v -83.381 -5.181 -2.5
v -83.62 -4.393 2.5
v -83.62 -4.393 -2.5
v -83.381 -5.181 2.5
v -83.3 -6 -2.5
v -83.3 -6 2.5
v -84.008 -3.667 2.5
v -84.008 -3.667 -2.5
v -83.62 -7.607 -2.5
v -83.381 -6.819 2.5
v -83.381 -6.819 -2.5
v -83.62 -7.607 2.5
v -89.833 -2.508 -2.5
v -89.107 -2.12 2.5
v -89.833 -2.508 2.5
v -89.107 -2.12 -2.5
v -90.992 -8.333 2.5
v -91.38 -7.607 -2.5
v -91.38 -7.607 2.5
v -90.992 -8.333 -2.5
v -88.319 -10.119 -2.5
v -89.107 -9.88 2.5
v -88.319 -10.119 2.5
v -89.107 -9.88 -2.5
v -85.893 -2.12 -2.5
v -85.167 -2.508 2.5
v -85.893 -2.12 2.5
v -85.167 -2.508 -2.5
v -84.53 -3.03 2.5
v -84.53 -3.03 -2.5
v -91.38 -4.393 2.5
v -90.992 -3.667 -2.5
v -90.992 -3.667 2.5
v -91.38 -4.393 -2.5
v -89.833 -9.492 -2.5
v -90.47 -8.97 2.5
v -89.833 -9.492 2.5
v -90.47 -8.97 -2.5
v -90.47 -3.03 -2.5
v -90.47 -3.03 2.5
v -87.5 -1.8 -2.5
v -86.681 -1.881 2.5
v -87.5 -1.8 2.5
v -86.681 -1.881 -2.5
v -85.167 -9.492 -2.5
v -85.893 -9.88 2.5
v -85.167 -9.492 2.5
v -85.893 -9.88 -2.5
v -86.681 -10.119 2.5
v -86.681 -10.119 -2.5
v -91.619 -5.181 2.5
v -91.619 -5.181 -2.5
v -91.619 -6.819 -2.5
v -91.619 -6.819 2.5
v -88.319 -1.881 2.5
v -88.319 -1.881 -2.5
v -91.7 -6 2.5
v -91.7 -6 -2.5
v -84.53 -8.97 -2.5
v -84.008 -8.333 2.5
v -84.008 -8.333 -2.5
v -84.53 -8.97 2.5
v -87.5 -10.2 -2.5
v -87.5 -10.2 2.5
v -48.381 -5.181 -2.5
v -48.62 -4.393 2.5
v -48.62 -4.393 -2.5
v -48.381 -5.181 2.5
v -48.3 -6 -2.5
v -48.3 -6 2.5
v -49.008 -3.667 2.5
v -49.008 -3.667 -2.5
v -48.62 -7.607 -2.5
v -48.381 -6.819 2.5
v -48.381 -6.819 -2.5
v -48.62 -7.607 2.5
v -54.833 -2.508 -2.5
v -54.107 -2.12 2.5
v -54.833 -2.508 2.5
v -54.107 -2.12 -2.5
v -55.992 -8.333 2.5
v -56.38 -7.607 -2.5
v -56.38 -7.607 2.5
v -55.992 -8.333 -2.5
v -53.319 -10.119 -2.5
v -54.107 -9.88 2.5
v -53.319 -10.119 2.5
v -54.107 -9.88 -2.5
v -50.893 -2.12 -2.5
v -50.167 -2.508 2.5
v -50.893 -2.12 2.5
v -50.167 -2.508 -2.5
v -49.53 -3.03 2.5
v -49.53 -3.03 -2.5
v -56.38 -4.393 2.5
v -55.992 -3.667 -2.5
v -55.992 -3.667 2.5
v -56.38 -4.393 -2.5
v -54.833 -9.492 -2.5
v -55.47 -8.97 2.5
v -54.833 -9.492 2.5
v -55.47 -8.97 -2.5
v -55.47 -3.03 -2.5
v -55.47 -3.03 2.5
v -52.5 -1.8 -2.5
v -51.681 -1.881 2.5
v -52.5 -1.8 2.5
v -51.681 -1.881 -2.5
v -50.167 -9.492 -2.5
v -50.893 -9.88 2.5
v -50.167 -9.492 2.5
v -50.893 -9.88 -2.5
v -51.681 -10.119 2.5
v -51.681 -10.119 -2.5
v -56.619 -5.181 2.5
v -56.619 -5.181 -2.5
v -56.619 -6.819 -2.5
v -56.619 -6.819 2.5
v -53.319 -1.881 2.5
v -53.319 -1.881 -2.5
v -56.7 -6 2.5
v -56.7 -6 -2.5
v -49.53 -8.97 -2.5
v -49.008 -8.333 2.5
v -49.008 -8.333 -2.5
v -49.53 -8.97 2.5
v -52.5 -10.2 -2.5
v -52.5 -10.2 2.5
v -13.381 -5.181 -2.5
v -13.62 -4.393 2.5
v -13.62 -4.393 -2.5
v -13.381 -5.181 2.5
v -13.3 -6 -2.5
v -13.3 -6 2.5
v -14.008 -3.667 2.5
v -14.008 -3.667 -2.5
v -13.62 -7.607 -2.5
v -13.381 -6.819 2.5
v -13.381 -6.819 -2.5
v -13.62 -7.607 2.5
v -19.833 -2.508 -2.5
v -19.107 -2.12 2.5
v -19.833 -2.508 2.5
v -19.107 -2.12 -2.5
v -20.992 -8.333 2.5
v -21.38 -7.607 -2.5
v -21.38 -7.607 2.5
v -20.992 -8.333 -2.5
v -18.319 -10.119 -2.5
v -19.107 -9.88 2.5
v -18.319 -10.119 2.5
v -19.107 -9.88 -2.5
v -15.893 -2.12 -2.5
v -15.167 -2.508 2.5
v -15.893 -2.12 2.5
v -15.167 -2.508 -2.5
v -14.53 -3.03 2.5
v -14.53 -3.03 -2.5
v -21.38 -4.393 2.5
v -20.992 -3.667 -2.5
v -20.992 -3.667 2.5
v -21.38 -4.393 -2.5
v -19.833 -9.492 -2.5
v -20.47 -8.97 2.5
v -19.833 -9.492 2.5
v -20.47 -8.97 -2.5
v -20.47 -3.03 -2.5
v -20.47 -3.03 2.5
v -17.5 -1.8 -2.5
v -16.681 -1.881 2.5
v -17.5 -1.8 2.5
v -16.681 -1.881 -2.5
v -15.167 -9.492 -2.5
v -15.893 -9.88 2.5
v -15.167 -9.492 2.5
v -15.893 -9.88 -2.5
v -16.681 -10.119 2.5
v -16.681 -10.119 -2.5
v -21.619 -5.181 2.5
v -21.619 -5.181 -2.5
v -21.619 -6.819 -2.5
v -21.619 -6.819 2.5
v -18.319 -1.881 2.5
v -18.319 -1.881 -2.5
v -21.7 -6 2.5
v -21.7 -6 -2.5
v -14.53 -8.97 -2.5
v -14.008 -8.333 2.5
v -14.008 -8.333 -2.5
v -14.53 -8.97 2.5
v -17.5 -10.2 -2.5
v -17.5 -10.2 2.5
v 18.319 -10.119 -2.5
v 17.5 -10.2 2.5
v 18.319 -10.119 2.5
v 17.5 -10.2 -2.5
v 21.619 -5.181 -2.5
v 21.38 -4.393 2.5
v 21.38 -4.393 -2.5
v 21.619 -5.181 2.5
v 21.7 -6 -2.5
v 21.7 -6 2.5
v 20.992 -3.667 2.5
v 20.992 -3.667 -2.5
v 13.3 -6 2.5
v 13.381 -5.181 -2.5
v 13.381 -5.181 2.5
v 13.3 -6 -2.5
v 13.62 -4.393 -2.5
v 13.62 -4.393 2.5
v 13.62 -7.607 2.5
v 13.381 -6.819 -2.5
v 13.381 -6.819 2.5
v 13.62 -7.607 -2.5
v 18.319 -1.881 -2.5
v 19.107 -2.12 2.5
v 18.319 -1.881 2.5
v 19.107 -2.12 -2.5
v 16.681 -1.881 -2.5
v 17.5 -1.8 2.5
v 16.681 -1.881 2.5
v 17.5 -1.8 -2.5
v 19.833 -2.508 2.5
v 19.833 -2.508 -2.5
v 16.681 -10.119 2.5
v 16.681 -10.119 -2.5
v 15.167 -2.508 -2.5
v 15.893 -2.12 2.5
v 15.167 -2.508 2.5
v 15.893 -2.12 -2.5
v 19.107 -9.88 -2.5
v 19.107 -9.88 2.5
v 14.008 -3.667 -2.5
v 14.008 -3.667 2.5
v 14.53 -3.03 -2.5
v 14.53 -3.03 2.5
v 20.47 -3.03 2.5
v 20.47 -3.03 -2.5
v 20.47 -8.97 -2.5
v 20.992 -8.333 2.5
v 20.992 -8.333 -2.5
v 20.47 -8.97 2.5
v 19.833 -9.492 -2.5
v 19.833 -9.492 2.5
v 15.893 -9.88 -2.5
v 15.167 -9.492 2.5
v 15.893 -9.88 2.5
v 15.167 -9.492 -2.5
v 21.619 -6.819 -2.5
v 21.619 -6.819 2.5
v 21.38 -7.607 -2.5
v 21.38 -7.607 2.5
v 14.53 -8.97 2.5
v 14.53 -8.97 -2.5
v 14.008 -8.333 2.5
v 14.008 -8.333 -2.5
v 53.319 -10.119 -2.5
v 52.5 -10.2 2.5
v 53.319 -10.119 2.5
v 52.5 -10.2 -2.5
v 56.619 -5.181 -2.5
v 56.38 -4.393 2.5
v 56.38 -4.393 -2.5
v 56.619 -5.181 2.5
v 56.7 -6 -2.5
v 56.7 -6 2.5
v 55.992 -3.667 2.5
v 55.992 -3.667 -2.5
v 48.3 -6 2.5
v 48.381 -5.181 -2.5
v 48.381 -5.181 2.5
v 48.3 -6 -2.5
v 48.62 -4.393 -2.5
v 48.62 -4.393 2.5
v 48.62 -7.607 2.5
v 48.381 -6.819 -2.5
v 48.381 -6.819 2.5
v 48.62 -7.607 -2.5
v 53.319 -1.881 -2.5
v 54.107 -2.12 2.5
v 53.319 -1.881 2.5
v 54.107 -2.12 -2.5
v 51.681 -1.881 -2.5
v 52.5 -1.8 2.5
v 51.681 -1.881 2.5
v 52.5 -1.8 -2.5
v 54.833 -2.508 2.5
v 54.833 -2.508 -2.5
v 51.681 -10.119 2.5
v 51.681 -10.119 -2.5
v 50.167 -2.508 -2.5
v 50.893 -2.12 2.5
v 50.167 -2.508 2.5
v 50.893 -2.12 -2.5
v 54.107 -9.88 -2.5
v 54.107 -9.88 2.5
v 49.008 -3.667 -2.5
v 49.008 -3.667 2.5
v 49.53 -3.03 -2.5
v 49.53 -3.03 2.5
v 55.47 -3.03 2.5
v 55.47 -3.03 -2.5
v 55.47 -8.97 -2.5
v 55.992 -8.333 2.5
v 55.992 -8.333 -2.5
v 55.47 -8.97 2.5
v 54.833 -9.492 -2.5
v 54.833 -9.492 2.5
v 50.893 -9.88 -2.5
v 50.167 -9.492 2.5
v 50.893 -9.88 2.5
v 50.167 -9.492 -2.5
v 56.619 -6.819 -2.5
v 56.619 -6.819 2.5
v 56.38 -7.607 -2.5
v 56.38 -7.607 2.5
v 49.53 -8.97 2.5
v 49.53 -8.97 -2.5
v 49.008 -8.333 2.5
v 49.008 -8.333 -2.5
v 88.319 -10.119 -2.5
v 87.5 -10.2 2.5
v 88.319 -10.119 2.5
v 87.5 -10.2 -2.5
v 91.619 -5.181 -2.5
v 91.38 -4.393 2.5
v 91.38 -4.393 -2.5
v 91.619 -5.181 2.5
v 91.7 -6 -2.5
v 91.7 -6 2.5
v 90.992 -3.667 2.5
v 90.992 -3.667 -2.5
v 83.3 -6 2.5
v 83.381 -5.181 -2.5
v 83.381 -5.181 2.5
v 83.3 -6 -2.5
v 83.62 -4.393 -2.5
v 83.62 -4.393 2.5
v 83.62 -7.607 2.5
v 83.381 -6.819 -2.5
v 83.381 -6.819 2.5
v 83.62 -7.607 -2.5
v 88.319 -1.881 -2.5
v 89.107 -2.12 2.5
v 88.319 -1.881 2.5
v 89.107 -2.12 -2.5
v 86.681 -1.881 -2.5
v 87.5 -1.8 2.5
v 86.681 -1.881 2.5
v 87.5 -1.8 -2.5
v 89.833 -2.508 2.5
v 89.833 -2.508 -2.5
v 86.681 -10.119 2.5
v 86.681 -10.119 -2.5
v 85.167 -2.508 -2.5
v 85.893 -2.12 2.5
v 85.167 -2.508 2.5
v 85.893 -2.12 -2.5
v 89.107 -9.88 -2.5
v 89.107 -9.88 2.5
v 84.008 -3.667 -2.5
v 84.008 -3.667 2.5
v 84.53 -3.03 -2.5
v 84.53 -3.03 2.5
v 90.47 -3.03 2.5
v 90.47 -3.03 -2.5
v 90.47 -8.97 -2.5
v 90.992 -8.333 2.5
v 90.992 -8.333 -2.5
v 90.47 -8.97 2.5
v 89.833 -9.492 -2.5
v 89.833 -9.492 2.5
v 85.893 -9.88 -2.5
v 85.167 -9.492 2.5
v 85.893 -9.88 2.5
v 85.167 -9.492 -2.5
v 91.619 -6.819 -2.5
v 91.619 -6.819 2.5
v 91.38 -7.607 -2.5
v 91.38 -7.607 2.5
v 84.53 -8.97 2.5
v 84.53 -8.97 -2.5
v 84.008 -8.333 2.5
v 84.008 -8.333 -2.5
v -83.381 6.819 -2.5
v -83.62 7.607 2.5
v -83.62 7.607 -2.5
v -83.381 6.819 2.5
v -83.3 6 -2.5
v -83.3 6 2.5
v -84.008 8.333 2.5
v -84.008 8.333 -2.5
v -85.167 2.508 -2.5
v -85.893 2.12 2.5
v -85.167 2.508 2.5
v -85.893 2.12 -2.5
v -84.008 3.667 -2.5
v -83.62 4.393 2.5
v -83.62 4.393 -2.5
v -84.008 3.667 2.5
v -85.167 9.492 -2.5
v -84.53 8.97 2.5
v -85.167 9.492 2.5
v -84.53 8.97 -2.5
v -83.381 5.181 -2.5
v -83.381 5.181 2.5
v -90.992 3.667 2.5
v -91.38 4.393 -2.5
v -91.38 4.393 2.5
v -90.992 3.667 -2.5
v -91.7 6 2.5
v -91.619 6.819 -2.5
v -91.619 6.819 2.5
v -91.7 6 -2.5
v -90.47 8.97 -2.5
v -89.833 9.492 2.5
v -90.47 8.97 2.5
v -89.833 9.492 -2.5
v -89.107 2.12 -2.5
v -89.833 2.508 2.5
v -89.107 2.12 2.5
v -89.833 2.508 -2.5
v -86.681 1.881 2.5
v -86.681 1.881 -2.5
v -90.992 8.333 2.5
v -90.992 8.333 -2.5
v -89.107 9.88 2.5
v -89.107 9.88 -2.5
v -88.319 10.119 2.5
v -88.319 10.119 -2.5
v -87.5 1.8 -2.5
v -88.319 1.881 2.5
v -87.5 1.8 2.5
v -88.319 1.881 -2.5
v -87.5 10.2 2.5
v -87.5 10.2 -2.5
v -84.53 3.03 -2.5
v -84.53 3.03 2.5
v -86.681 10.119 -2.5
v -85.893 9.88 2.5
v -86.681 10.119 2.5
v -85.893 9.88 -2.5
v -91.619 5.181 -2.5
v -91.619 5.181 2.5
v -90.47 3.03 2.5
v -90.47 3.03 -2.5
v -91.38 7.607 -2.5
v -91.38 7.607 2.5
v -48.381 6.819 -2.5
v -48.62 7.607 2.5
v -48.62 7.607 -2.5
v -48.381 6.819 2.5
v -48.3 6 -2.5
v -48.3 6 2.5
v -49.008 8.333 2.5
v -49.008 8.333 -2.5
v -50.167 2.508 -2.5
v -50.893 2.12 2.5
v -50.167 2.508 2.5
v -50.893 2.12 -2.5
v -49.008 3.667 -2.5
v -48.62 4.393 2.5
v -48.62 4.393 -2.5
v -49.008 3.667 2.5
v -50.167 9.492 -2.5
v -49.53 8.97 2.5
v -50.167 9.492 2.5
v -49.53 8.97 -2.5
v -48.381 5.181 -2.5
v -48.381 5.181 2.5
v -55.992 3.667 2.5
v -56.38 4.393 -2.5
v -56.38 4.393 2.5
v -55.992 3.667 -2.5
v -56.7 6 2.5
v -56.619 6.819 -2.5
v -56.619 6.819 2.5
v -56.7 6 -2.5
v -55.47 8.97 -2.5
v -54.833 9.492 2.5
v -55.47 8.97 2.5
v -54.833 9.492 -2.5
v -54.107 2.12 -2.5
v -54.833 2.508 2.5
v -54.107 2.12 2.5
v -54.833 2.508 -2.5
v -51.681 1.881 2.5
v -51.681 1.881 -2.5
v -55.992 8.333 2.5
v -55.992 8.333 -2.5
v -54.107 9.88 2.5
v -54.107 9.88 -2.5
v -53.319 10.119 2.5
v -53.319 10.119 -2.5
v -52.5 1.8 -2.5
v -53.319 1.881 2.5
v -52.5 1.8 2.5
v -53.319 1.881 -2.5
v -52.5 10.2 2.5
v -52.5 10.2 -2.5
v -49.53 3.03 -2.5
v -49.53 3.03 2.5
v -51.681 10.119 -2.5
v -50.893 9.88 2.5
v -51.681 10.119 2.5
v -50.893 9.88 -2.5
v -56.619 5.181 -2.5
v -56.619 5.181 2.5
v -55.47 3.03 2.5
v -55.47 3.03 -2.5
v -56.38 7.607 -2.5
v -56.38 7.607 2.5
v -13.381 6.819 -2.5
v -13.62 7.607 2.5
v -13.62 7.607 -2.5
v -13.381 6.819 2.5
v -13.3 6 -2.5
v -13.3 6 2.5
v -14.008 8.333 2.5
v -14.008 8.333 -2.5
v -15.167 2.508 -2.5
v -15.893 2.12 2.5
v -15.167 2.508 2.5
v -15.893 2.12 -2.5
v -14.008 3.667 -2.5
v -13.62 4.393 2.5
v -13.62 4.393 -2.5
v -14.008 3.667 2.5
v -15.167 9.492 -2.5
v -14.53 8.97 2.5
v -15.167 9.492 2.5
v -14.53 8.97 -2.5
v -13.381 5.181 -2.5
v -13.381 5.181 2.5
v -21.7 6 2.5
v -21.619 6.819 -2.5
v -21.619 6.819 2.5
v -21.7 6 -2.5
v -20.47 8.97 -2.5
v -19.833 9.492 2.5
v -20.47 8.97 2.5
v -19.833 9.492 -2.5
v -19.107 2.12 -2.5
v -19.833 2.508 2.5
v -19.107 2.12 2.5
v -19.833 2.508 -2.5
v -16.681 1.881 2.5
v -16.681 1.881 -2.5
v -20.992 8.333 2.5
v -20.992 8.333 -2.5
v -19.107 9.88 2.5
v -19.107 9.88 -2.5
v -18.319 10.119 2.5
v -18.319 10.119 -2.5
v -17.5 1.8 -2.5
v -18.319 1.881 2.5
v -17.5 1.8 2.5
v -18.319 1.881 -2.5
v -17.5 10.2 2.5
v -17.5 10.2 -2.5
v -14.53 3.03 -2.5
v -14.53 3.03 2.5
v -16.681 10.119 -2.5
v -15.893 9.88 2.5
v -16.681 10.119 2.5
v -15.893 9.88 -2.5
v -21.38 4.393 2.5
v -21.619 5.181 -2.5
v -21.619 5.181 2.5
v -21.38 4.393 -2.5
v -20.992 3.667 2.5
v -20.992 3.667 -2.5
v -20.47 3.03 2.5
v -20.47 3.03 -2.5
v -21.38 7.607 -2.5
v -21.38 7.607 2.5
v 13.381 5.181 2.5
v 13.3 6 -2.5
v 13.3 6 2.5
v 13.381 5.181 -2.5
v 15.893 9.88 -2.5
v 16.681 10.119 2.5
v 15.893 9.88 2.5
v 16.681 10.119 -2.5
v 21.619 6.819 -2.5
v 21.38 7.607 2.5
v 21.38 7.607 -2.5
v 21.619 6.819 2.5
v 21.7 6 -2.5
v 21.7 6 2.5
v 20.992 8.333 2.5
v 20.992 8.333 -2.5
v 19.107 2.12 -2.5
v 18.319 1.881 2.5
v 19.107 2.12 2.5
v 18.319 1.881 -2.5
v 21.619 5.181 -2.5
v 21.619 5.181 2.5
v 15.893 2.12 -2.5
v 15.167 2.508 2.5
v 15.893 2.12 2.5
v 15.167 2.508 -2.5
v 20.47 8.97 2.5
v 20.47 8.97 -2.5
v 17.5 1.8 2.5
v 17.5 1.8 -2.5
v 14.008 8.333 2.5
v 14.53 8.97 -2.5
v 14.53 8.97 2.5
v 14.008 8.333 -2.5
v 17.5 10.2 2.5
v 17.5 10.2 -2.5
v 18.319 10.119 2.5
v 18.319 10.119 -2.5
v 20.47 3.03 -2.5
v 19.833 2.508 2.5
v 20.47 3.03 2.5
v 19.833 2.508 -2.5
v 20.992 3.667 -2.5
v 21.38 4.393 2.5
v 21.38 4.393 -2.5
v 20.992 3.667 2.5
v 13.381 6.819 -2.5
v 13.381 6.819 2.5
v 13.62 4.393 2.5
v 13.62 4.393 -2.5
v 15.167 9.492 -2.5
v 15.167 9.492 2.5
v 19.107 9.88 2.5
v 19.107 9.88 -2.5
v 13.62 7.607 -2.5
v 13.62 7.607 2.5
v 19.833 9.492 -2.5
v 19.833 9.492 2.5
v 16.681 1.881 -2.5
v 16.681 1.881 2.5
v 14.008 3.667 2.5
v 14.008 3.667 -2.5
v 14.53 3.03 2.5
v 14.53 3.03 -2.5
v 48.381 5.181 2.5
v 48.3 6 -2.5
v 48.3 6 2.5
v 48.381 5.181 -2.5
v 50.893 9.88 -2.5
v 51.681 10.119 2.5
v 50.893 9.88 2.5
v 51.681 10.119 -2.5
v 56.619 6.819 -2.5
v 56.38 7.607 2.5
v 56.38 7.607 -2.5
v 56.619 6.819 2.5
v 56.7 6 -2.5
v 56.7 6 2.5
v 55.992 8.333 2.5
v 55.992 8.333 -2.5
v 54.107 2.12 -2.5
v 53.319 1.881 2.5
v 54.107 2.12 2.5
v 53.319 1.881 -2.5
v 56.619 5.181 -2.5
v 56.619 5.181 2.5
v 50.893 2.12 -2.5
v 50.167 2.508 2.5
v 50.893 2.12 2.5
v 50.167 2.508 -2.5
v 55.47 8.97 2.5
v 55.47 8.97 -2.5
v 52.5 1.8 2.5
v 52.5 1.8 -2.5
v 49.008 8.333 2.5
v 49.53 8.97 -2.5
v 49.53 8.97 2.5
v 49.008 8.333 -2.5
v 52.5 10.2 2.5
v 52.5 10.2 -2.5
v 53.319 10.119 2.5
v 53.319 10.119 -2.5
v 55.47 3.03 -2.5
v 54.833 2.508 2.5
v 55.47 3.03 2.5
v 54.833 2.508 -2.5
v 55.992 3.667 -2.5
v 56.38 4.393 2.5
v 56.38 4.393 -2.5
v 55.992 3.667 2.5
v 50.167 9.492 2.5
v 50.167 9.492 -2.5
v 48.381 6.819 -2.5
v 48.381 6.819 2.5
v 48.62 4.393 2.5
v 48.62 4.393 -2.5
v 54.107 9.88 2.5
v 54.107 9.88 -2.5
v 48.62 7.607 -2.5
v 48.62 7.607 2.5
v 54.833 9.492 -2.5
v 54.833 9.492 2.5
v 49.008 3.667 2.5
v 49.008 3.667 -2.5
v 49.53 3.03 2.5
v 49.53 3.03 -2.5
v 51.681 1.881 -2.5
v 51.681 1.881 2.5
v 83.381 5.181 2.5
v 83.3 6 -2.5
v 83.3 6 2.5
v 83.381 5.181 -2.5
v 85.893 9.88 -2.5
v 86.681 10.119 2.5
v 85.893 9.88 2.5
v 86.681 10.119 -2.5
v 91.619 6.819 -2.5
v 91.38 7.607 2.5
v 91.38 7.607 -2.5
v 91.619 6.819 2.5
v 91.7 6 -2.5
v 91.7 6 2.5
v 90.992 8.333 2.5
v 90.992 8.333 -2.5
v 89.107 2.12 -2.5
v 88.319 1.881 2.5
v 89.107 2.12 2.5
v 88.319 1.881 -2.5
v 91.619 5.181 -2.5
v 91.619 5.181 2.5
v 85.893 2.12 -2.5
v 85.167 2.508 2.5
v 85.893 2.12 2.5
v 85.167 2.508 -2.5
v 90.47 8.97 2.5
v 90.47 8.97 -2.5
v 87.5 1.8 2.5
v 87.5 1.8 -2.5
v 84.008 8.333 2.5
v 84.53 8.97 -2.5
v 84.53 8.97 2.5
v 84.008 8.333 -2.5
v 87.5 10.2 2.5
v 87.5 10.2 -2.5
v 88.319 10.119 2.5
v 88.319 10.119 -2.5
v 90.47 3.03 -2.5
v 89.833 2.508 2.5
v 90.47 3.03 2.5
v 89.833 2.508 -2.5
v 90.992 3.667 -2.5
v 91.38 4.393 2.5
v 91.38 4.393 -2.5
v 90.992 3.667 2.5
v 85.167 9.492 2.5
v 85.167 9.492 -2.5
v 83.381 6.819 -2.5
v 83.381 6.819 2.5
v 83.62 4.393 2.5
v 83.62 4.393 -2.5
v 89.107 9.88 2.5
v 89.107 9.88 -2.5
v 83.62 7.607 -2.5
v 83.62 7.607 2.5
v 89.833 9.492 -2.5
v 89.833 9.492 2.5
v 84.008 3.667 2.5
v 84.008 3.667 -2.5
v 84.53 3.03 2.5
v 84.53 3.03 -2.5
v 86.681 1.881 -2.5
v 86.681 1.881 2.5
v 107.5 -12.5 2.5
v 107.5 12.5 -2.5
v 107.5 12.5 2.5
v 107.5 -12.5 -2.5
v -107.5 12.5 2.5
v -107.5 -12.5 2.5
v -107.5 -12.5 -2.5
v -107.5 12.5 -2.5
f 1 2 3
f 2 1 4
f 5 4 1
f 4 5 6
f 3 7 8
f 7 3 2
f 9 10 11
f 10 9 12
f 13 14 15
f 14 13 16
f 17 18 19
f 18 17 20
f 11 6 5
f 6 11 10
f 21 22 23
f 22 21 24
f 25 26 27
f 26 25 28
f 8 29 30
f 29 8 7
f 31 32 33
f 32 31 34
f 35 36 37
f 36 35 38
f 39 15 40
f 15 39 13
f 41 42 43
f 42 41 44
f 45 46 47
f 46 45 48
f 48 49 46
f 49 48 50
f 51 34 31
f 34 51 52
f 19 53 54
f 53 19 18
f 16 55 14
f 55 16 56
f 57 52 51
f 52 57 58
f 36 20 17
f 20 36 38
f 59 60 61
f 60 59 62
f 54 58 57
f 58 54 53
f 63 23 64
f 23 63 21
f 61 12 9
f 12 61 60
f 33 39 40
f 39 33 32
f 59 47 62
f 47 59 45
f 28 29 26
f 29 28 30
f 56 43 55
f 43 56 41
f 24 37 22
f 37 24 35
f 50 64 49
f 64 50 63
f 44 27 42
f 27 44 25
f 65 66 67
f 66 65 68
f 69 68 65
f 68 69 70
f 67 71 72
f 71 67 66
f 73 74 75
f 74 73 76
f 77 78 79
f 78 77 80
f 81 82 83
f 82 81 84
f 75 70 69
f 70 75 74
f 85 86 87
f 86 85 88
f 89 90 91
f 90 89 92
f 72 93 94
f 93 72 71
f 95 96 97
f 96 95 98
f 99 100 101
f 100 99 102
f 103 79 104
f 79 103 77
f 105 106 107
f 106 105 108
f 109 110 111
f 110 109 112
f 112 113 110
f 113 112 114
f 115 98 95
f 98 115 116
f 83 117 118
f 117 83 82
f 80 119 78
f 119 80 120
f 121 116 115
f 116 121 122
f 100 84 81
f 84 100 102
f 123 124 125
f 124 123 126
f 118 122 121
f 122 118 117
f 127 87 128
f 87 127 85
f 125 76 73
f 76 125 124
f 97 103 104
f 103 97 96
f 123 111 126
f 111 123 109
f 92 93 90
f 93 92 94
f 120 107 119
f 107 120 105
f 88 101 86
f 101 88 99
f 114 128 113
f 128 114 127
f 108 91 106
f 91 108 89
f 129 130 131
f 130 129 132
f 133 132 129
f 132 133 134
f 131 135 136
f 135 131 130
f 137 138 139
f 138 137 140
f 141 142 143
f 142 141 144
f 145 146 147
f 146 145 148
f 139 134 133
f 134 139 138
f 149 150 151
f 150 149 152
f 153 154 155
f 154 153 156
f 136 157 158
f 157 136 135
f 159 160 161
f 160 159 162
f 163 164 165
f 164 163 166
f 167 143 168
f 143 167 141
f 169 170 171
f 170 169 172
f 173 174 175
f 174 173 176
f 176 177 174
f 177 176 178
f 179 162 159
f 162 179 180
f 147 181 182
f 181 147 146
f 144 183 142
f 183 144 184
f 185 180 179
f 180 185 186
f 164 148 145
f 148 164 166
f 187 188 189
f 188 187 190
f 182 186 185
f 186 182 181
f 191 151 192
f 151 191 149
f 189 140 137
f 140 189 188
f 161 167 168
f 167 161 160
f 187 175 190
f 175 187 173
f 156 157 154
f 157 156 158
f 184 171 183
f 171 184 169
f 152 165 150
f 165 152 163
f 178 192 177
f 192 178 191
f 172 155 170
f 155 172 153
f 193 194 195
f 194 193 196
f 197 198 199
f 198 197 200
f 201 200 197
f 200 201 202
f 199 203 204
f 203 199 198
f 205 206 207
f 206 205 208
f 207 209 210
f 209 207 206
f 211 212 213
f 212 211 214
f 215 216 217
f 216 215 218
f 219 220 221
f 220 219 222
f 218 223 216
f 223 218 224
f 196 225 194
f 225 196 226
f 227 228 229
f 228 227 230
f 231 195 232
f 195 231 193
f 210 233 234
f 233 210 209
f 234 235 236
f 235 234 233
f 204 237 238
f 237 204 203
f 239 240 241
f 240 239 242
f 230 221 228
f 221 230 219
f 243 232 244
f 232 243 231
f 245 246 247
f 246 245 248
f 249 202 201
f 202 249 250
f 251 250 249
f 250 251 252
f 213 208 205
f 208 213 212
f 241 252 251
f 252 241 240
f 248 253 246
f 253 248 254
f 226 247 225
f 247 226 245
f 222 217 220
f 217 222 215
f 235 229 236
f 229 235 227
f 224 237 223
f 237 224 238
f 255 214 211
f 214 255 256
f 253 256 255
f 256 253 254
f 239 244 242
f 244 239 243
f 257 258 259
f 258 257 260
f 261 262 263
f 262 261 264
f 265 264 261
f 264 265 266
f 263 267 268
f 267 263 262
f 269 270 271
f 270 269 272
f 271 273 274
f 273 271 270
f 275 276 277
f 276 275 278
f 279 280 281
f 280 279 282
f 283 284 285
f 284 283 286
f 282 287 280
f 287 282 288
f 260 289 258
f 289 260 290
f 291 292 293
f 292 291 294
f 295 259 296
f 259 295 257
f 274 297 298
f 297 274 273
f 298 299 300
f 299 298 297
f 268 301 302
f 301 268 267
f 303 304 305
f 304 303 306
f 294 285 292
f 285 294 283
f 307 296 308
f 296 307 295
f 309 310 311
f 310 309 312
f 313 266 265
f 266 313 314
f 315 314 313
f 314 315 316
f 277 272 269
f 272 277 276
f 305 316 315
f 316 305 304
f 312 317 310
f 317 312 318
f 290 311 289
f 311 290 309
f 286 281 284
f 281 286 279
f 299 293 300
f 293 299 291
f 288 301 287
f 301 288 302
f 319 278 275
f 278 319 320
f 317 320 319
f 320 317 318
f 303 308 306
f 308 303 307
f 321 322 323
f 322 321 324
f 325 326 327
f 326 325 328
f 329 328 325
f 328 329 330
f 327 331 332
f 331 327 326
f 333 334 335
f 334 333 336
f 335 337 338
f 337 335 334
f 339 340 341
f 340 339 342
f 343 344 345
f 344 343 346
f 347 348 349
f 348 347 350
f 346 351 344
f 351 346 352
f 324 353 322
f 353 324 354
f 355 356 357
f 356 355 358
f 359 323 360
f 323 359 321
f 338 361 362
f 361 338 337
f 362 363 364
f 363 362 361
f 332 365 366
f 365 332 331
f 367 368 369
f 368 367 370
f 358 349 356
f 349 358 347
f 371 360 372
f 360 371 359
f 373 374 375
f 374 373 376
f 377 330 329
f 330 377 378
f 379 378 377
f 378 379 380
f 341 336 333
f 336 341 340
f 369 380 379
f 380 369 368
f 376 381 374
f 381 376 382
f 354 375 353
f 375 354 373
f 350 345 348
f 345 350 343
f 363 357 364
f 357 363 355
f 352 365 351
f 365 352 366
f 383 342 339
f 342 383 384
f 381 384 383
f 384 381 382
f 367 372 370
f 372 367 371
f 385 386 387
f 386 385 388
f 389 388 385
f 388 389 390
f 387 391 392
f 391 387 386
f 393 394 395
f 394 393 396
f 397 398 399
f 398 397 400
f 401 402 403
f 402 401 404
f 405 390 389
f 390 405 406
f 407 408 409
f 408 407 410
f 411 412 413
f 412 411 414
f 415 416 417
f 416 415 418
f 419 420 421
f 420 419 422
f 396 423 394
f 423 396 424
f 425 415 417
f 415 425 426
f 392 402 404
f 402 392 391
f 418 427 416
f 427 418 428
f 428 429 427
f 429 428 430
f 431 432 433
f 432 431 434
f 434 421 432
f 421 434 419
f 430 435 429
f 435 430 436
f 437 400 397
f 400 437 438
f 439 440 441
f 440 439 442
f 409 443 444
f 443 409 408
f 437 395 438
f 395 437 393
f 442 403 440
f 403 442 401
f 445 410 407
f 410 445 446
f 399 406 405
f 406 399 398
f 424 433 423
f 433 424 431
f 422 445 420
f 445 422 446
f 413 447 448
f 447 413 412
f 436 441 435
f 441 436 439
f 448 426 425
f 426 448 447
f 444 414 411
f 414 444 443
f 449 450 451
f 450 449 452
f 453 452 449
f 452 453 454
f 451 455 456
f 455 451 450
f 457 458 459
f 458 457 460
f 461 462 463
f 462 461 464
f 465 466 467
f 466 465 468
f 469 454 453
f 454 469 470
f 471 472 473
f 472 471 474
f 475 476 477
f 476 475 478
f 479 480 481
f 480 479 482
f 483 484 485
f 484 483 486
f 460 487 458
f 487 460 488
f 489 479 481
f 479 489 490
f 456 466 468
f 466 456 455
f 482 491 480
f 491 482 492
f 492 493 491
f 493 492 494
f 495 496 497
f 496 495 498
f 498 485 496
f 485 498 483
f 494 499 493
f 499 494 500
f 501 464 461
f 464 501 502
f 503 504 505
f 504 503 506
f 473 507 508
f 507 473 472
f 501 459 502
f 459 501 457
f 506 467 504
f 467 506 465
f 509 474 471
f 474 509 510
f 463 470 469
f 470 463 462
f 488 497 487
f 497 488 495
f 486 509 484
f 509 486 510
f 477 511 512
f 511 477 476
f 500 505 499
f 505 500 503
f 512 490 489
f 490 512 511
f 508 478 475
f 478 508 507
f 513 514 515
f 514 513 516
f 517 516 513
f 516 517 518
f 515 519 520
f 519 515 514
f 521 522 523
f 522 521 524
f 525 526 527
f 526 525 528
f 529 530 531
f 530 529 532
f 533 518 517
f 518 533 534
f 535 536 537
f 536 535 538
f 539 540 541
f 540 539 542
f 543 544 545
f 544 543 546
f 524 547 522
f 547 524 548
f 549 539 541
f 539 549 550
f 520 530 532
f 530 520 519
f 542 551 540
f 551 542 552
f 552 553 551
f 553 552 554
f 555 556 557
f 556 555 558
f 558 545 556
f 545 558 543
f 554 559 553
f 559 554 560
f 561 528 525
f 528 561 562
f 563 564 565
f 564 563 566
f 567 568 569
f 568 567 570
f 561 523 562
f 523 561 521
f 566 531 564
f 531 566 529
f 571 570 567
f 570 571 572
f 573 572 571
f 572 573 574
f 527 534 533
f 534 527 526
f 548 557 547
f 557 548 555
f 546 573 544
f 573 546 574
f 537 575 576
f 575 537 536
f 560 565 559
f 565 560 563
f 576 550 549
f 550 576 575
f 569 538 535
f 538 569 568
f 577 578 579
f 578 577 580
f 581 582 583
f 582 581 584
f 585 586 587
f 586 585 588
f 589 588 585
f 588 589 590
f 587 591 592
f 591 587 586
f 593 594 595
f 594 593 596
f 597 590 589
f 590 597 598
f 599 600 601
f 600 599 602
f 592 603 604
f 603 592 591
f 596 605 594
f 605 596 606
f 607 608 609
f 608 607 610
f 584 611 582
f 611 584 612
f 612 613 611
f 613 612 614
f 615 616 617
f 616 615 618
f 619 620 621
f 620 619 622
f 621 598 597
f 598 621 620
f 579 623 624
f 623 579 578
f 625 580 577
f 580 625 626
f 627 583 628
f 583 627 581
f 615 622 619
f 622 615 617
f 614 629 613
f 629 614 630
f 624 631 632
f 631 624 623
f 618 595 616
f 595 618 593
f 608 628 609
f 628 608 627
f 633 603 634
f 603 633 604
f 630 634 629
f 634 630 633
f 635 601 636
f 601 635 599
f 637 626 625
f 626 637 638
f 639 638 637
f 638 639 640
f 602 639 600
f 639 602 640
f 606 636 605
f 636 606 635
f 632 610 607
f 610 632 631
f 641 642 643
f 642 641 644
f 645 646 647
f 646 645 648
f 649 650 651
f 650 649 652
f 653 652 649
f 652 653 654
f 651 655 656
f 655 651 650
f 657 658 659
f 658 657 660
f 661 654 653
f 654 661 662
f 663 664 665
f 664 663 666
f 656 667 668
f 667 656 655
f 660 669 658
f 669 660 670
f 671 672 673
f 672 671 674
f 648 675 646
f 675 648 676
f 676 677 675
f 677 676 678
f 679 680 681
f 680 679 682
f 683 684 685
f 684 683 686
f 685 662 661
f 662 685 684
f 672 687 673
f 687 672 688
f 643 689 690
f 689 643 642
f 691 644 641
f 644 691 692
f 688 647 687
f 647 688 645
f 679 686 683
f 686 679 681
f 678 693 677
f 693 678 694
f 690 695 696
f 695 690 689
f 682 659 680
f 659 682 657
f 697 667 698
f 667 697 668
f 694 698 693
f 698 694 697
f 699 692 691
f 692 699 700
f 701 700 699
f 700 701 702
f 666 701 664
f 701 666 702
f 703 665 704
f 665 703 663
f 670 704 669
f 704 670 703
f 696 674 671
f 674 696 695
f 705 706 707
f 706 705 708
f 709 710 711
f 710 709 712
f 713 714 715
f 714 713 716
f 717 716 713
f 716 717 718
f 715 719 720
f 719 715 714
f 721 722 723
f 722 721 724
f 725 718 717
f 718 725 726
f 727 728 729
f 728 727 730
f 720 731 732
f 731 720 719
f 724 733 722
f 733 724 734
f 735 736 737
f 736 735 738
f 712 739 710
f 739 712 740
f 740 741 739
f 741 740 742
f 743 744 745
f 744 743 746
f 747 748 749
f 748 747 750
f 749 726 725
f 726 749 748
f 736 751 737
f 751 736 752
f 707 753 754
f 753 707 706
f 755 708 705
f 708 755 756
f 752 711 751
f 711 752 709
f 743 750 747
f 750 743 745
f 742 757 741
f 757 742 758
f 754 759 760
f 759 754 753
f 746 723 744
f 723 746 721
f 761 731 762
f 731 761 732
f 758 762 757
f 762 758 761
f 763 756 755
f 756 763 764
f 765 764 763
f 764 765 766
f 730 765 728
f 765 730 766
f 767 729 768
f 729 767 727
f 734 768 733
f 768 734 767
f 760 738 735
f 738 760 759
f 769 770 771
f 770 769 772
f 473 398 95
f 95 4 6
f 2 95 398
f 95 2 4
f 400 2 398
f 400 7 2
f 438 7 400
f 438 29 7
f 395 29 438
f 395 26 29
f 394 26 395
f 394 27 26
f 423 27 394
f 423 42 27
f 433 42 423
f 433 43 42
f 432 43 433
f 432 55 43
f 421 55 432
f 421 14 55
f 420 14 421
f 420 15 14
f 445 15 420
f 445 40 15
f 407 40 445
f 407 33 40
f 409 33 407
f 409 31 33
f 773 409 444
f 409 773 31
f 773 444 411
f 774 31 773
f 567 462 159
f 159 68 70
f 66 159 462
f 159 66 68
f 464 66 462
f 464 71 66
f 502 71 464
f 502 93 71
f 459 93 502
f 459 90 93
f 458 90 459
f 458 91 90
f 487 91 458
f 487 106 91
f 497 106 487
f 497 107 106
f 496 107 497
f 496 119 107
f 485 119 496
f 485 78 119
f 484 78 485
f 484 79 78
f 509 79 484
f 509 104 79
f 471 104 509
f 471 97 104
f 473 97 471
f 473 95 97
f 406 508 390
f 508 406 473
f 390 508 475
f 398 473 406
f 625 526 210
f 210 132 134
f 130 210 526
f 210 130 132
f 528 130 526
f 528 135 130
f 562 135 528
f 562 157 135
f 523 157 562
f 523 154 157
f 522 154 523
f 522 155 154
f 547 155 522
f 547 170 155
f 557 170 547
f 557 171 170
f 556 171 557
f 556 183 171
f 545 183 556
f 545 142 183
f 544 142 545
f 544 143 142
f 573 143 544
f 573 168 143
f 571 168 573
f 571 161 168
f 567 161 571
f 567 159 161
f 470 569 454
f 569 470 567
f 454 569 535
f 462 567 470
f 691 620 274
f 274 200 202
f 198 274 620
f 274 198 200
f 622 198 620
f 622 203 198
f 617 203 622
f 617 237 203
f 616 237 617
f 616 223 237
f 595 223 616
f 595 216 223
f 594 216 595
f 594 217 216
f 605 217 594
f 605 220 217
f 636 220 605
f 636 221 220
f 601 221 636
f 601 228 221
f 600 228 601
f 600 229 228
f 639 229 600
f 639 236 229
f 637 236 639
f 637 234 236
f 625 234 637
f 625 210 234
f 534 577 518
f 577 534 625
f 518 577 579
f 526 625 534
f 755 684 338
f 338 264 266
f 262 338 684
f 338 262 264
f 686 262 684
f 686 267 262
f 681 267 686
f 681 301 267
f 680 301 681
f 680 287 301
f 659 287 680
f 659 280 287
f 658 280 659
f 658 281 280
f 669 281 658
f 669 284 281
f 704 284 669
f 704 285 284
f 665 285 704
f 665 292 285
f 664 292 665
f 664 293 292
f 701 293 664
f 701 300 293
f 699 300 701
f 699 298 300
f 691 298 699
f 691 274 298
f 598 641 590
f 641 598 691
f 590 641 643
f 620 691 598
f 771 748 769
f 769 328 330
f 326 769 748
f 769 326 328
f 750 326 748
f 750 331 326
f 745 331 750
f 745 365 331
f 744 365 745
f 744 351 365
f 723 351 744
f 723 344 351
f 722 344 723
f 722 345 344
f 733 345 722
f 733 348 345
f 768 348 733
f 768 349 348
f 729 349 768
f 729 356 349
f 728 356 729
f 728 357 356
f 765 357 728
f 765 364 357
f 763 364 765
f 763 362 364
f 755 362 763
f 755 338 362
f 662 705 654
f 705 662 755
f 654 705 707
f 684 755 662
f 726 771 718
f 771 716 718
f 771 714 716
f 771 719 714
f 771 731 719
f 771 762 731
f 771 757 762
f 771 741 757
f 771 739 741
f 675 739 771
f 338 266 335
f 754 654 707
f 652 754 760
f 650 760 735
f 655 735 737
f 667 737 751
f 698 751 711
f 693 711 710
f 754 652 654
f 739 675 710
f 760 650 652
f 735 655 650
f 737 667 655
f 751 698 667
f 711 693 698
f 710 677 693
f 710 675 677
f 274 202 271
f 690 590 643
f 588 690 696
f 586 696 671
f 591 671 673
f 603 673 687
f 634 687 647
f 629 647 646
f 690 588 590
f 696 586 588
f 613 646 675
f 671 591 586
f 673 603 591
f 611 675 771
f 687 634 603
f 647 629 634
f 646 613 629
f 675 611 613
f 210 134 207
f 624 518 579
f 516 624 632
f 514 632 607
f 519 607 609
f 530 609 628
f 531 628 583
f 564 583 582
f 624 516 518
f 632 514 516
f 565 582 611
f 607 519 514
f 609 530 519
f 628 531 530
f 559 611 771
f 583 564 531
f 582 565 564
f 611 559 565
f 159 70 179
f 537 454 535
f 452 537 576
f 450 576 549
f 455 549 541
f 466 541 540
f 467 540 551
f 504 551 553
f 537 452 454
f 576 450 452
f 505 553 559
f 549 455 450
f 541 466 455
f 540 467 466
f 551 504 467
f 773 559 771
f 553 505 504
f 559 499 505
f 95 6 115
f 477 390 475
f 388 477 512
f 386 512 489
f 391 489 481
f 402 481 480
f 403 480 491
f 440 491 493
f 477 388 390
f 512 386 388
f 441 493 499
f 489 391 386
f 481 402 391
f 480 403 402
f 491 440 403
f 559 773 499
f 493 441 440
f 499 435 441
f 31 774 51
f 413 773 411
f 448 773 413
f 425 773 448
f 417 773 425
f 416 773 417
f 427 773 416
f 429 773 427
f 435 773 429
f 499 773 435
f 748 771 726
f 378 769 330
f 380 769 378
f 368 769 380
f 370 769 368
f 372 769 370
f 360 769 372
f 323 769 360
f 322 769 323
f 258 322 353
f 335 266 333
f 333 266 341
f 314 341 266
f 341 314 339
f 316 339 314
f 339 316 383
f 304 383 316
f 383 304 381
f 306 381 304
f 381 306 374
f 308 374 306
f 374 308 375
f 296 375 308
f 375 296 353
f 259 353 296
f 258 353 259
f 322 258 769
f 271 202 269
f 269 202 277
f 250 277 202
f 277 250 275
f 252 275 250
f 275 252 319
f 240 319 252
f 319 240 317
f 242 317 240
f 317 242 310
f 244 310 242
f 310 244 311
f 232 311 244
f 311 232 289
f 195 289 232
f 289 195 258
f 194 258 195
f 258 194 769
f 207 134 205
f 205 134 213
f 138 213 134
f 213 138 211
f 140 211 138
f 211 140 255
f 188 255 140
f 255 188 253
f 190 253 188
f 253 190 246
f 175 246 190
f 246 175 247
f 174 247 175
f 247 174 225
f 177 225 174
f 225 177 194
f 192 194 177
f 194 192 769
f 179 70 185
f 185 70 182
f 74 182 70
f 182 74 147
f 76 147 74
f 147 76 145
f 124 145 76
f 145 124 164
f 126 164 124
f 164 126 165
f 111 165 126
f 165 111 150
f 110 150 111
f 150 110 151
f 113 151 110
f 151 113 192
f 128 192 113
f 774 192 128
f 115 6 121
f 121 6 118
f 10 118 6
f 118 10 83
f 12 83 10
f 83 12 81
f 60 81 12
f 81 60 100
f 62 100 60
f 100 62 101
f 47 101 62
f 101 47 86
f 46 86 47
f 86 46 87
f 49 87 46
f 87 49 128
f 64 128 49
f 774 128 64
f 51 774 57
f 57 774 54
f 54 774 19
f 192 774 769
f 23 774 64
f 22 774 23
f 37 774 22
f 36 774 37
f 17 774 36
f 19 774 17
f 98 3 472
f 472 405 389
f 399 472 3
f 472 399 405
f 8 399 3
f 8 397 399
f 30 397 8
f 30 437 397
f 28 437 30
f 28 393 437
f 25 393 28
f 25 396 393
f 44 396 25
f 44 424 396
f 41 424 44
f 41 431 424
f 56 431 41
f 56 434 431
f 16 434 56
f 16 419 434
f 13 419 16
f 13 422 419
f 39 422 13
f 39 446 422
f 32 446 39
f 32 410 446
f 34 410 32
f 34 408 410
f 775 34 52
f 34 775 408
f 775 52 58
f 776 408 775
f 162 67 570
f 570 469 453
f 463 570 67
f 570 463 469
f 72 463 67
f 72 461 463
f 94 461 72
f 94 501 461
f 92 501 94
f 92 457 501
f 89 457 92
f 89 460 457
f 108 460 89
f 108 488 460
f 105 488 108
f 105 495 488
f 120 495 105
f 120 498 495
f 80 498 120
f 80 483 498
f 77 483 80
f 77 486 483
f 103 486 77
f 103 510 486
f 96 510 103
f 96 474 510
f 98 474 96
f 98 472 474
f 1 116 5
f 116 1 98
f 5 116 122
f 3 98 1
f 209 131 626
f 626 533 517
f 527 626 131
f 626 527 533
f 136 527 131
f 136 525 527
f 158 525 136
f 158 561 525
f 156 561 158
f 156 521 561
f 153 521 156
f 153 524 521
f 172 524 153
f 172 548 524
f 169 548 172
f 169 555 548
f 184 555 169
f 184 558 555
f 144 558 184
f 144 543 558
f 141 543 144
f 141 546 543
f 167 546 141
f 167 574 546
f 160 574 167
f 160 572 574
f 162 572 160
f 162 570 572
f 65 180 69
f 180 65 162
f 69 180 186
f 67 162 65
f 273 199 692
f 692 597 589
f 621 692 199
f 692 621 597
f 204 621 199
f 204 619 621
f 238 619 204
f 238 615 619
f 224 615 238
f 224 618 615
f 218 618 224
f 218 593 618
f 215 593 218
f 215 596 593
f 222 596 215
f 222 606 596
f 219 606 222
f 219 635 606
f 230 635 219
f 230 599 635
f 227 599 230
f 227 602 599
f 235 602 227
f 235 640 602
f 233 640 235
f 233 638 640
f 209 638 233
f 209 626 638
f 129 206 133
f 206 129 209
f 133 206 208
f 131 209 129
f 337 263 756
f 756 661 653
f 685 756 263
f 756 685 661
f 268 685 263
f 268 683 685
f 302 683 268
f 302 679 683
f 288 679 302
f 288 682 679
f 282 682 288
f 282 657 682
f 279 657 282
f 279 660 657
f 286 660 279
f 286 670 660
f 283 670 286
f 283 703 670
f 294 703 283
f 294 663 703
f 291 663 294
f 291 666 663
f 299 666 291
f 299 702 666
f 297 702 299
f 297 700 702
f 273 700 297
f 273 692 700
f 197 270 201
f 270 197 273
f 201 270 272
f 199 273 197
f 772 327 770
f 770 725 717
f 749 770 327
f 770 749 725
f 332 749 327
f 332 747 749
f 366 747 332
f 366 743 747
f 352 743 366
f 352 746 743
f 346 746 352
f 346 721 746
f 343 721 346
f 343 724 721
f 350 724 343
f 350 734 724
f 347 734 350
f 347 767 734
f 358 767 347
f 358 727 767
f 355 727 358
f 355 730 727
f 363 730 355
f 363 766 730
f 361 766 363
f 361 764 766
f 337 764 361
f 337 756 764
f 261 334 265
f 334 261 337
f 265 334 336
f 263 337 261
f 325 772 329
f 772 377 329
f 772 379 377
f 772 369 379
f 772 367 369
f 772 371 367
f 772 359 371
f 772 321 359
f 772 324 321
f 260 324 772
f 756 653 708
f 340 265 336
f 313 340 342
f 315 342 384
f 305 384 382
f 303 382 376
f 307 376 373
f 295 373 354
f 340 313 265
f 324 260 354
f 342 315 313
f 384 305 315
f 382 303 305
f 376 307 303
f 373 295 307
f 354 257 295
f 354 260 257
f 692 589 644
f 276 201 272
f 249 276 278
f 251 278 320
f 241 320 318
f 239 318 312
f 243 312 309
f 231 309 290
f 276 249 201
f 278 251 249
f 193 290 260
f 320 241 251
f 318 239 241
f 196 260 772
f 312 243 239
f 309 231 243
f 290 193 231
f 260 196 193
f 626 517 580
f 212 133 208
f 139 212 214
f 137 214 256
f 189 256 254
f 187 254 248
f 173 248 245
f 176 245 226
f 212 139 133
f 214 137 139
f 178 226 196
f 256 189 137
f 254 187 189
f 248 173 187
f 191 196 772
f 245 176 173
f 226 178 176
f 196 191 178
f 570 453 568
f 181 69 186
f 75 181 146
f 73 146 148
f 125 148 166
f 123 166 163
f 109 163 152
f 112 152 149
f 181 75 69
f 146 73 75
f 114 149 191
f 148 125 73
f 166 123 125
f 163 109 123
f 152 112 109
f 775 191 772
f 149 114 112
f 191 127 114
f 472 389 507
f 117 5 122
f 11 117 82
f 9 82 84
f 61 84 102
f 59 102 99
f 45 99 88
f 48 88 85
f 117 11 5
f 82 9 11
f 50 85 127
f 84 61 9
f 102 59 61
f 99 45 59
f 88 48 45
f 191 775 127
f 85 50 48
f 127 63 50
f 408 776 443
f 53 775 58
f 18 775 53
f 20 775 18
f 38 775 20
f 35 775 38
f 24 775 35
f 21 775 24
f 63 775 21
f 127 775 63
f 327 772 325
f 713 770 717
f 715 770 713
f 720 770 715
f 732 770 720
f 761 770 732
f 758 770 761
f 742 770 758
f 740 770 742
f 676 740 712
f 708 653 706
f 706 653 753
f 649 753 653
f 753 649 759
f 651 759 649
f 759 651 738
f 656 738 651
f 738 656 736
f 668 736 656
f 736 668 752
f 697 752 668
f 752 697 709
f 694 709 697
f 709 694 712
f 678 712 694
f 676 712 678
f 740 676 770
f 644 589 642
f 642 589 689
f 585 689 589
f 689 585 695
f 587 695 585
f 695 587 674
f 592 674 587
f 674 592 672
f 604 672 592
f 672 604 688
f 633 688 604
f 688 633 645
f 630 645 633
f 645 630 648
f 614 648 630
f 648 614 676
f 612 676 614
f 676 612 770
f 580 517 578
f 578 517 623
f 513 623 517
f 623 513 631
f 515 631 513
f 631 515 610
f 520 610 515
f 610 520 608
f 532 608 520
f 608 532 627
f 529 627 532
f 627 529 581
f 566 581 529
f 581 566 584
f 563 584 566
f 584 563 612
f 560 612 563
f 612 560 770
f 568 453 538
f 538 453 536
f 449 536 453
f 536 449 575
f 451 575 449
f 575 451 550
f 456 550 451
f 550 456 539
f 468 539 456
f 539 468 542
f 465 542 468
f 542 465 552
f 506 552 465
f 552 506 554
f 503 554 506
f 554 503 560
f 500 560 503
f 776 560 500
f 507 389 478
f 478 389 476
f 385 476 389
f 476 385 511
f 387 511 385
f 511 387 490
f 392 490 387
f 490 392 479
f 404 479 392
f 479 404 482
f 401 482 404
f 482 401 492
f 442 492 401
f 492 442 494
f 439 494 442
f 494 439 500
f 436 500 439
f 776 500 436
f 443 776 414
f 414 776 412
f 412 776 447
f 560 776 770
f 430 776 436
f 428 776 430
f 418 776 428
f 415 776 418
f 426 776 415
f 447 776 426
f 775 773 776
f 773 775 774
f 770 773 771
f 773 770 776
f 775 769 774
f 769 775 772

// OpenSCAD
$fn = 32;

// ----------------------------------------------------------------------
// Hole bar, 6 x Ø8.4
// tworows layout, 20 mm edge offset
// ----------------------------------------------------------------------

// --- parameters (mm) ---
bar_w = 25;       // bar width (Y)
bar_t = 5;        // bar thickness (Z)
holes = 6;        // holes per row
hole_d = 8.4;     // hole diameter
edge = 20;        // offset from the bar end to the first hole
pitch = 35;       // pitch between neighbouring holes
row_offset = 12;  // distance between the two rows

// --- derived feature positions (mm) ---
span = (holes - 1) * pitch;   // = 175   distance between the end holes
bar_l = span + 2 * edge;      // = 215   overall bar length
start_x = -bar_l / 2 + edge;  // = -87.5   X of the first hole
feature_centers = [
  [start_x + 0 * pitch, -row_offset / 2],
  [start_x + 1 * pitch, -row_offset / 2],
  [start_x + 2 * pitch, -row_offset / 2],
  [start_x + 3 * pitch, -row_offset / 2],
  [start_x + 4 * pitch, -row_offset / 2],
  [start_x + 5 * pitch, -row_offset / 2]
];   // hole centres of the first row
row2_centers = [
  [start_x + 0 * pitch, row_offset / 2],
  [start_x + 1 * pitch, row_offset / 2],
  [start_x + 2 * pitch, row_offset / 2],
  [start_x + 3 * pitch, row_offset / 2],
  [start_x + 4 * pitch, row_offset / 2],
  [start_x + 5 * pitch, row_offset / 2]
];   // hole centres of the second row

// bar with two rows of holes, both read from their own centre arrays
difference() {
  translate([-bar_l / 2, -bar_w / 2, -bar_t / 2]) cube([bar_l, bar_w, bar_t]);
  for (centre = feature_centers)
    translate([centre[0], centre[1], 0])
      cylinder(d = hole_d, h = bar_t + 2, center = true);
  for (centre = row2_centers)
    translate([centre[0], centre[1], 0])
      cylinder(d = hole_d, h = bar_t + 2, center = true);
}
